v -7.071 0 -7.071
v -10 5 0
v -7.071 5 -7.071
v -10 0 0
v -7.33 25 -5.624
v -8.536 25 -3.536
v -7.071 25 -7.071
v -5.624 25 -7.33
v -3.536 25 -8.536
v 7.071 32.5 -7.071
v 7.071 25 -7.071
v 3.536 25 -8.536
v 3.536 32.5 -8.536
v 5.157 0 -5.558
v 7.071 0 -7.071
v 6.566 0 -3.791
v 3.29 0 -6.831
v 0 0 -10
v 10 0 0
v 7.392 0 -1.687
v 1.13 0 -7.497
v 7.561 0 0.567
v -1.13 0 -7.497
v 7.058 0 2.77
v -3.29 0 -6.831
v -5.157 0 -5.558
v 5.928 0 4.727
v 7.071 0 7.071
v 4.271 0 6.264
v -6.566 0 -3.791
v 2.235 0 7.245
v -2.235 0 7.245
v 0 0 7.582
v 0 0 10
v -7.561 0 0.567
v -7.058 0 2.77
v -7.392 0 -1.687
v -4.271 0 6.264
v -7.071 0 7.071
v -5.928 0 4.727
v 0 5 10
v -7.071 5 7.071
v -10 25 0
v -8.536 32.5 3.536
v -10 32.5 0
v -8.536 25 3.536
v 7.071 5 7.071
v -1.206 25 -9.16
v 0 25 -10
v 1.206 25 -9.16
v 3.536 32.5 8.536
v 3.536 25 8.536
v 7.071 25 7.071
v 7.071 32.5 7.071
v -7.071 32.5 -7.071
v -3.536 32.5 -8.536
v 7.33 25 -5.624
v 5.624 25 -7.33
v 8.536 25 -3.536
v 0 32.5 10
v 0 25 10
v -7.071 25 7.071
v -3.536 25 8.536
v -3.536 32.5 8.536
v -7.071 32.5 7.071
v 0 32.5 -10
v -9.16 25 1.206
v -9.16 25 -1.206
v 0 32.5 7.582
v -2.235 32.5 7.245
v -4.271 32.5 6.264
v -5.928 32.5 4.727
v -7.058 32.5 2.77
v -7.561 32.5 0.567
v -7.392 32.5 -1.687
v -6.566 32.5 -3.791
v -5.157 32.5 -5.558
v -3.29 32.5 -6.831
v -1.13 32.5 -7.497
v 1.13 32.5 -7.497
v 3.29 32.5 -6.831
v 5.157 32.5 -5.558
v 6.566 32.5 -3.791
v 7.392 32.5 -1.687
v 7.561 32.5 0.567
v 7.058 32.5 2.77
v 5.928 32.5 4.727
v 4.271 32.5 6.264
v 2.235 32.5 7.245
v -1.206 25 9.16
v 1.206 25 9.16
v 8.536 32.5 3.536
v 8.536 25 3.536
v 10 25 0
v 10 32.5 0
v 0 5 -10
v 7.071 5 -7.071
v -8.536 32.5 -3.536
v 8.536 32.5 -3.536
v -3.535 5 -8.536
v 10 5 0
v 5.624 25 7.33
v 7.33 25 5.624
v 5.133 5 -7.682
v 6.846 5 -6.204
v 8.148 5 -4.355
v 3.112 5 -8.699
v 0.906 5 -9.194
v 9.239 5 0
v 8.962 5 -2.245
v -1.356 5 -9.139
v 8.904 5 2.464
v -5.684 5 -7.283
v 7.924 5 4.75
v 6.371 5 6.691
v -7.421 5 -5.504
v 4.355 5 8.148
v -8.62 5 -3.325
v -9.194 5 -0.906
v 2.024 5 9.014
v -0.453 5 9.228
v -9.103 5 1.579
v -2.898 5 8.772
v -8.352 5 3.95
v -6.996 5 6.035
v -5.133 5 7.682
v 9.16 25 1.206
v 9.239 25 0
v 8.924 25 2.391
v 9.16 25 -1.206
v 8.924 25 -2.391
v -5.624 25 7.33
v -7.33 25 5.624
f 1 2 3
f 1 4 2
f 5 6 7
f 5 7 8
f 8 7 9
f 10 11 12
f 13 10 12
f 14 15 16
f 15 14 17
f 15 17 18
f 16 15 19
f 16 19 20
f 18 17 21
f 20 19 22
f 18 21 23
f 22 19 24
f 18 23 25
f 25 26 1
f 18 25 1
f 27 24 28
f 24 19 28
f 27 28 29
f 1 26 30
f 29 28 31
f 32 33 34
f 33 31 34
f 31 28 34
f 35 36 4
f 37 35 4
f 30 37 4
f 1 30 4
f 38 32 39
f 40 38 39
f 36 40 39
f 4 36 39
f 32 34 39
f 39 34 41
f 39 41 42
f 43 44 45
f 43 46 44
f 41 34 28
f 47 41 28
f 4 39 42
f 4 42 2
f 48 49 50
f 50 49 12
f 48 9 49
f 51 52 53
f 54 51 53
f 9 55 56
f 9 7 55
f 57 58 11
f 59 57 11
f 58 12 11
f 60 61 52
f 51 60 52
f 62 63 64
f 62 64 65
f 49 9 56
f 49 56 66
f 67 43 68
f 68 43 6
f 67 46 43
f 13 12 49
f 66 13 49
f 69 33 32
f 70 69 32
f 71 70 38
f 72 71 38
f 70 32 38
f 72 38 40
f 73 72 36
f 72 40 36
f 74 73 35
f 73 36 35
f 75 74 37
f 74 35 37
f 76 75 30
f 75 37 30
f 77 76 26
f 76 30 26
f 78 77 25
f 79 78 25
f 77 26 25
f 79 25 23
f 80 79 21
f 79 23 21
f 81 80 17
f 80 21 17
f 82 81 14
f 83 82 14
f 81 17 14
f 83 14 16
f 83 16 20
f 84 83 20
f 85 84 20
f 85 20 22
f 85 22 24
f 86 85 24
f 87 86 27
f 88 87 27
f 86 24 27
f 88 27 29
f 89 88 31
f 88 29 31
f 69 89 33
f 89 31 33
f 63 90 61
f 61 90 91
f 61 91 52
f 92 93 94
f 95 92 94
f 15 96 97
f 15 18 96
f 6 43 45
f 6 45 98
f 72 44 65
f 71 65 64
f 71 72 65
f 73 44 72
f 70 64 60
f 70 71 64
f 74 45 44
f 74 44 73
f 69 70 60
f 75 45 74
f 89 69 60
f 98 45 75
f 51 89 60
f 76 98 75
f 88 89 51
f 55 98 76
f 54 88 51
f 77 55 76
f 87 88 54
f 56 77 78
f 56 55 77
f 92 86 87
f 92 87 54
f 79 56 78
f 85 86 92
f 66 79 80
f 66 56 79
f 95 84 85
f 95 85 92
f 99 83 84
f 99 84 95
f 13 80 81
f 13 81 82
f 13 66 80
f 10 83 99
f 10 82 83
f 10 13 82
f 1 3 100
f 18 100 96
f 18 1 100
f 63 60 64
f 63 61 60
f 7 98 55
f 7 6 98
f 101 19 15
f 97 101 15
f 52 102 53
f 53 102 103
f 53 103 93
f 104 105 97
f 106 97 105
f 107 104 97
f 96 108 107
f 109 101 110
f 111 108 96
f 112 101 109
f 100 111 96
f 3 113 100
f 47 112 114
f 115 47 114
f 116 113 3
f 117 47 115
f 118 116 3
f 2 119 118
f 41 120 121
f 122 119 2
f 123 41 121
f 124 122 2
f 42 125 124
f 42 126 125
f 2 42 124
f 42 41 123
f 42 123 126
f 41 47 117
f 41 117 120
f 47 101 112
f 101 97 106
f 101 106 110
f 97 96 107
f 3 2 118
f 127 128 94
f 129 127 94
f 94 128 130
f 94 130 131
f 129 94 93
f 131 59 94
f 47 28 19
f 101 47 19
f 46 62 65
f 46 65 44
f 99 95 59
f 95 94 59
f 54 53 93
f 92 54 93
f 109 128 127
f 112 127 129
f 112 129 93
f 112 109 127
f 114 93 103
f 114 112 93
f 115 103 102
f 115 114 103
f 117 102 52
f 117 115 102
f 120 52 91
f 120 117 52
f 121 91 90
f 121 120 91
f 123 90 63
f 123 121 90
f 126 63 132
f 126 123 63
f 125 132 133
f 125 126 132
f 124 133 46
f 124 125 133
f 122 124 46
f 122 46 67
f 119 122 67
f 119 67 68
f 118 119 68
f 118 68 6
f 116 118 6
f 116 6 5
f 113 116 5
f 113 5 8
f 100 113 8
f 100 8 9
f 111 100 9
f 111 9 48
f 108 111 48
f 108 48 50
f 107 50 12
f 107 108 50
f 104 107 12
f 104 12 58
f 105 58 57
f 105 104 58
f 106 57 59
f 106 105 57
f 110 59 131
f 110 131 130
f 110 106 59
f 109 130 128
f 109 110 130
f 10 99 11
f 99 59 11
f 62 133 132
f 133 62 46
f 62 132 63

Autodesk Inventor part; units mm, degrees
ref_plane "YZ Plane" through (0, 0, 0) normal (1, 0, 0) x (0, 1, 0)
ref_plane "XZ Plane" through (0, 0, 0) normal (0, 1, 0) x (-1, 0, 0)
ref_plane "XY Plane" through (0, 0, 0) normal (0, 0, 1) x (1, 0, 0)
sketch "Boceto1" plane through (0, 0, 0) normal (0, 1, 0) x (-1, 0, 0)
  circle A0 centre (0, 0) radius 10
  line L0 (7.0711, -7.0711) -> (0, -10)
  line L1 (10, 0) -> (7.0711, -7.0711)
  line L2 (0, -10) -> (-7.0711, -7.0711)
  line L3 (-10, 0) -> (-7.0711, -7.0711)
  line L4 (0, 10) -> (7.0711, 7.0711)
  line L5 (7.0711, 7.0711) -> (10, 0)
  line L6 (0, 0) -> (0, 10)
  line L7 (0, 10) -> (-7.0711, 7.0711)
  line L8 (-7.0711, 7.0711) -> (-10, 0)
  circle A1 centre (0, 0) radius 10
  line L9 (7.0711, -7.0711) -> (0, -10)
  line L10 (10, 0) -> (7.0711, -7.0711)
  line L11 (0, -10) -> (-7.0711, -7.0711)
  line L12 (-10, 0) -> (-7.0711, -7.0711)
  line L13 (0, 10) -> (7.0711, 7.0711)
  line L14 (7.0711, 7.0711) -> (10, 0)
  line L15 (0, 0) -> (0, 10)
  line L16 (-7.0711, 7.0711) -> (-10, 0)
  line L17 (0, 10) -> (-7.0711, 7.0711)
  dimension "d0" = 20
  dimension "d5" = 20
extrude "Extrusión1" add sketch "Boceto1" along normal blind 5 contours L1 L0 L2 L3 L8 L7 L4 L5
sketch "Boceto2" plane through (0, 5, 0) normal (0, 1, 0) x (1, 0, 0)
  circle A0 centre (0, 0) radius 9.2388
  line L0 (0, 10) -> (-7.0711, 7.0711) projected
extrude "Extrusión2" add sketch "Boceto2" along normal blind 20
sketch "Boceto3" plane through (0, 25, 0) normal (0, 1, 0) x (1, 0, 0)
  line L0 (7.0711, -7.0711) -> (8.5355, -3.5355) projected
  line L1 (8.5355, -3.5355) -> (10, 0) projected
  line L2 (10, 0) -> (8.5355, 3.5355) projected
  line L3 (8.5355, 3.5355) -> (7.0711, 7.0711) projected
  line L4 (7.0711, 7.0711) -> (3.5355, 8.5355) projected
  line L5 (3.5355, 8.5355) -> (0, 10) projected
  line L6 (0, -10) -> (3.5355, -8.5355) projected
  line L7 (3.5355, -8.5355) -> (7.0711, -7.0711) projected
  line L8 (0, -10) -> (7.0711, -7.0711)
  line L9 (7.0711, -7.0711) -> (10, 0) projected
  line L10 (10, 0) -> (7.0711, 7.0711) projected
  line L11 (10, 0) -> (7.0711, 7.0711)
  line L12 (7.0711, 7.0711) -> (0, 10)
  line L13 (0, 0) -> (0, 10)
  line L14 (-7.0711, -7.0711) -> (-8.5355, -3.5355)
  line L15 (-8.5355, -3.5355) -> (-10, 0)
  line L16 (-10, 0) -> (-8.5355, 3.5355)
  line L17 (-8.5355, 3.5355) -> (-7.0711, 7.0711)
  line L18 (-7.0711, 7.0711) -> (-3.5355, 8.5355)
  line L19 (-3.5355, 8.5355) -> (0, 10)
  line L20 (0, -10) -> (-3.5355, -8.5355)
  line L21 (-3.5355, -8.5355) -> (-7.0711, -7.0711)
  line L22 (0, -10) -> (-7.0711, -7.0711)
  line L23 (-7.0711, -7.0711) -> (-10, 0)
  line L24 (-10, 0) -> (-7.0711, 7.0711)
  line L25 (-10, 0) -> (-7.0711, 7.0711)
  line L26 (-7.0711, 7.0711) -> (0, 10)
extrude "Extrusión3" add sketch "Boceto3" along normal blind 7.5
sketch "Boceto4" plane through (0, 32.5, 0) normal (0, 1, 0) x (1, 0, 0)
  point P0 (0, 0)
  point P1 (0, 0)
hole "Agujero1" at (0, 32.5, 0) direction (0, -1, 0) diameter 15.1638 end through all thread size "11/16-12 UN" class "2B" standard "ANSI Unified Screw Threads"
properties part number "TUBO_METALICO"
